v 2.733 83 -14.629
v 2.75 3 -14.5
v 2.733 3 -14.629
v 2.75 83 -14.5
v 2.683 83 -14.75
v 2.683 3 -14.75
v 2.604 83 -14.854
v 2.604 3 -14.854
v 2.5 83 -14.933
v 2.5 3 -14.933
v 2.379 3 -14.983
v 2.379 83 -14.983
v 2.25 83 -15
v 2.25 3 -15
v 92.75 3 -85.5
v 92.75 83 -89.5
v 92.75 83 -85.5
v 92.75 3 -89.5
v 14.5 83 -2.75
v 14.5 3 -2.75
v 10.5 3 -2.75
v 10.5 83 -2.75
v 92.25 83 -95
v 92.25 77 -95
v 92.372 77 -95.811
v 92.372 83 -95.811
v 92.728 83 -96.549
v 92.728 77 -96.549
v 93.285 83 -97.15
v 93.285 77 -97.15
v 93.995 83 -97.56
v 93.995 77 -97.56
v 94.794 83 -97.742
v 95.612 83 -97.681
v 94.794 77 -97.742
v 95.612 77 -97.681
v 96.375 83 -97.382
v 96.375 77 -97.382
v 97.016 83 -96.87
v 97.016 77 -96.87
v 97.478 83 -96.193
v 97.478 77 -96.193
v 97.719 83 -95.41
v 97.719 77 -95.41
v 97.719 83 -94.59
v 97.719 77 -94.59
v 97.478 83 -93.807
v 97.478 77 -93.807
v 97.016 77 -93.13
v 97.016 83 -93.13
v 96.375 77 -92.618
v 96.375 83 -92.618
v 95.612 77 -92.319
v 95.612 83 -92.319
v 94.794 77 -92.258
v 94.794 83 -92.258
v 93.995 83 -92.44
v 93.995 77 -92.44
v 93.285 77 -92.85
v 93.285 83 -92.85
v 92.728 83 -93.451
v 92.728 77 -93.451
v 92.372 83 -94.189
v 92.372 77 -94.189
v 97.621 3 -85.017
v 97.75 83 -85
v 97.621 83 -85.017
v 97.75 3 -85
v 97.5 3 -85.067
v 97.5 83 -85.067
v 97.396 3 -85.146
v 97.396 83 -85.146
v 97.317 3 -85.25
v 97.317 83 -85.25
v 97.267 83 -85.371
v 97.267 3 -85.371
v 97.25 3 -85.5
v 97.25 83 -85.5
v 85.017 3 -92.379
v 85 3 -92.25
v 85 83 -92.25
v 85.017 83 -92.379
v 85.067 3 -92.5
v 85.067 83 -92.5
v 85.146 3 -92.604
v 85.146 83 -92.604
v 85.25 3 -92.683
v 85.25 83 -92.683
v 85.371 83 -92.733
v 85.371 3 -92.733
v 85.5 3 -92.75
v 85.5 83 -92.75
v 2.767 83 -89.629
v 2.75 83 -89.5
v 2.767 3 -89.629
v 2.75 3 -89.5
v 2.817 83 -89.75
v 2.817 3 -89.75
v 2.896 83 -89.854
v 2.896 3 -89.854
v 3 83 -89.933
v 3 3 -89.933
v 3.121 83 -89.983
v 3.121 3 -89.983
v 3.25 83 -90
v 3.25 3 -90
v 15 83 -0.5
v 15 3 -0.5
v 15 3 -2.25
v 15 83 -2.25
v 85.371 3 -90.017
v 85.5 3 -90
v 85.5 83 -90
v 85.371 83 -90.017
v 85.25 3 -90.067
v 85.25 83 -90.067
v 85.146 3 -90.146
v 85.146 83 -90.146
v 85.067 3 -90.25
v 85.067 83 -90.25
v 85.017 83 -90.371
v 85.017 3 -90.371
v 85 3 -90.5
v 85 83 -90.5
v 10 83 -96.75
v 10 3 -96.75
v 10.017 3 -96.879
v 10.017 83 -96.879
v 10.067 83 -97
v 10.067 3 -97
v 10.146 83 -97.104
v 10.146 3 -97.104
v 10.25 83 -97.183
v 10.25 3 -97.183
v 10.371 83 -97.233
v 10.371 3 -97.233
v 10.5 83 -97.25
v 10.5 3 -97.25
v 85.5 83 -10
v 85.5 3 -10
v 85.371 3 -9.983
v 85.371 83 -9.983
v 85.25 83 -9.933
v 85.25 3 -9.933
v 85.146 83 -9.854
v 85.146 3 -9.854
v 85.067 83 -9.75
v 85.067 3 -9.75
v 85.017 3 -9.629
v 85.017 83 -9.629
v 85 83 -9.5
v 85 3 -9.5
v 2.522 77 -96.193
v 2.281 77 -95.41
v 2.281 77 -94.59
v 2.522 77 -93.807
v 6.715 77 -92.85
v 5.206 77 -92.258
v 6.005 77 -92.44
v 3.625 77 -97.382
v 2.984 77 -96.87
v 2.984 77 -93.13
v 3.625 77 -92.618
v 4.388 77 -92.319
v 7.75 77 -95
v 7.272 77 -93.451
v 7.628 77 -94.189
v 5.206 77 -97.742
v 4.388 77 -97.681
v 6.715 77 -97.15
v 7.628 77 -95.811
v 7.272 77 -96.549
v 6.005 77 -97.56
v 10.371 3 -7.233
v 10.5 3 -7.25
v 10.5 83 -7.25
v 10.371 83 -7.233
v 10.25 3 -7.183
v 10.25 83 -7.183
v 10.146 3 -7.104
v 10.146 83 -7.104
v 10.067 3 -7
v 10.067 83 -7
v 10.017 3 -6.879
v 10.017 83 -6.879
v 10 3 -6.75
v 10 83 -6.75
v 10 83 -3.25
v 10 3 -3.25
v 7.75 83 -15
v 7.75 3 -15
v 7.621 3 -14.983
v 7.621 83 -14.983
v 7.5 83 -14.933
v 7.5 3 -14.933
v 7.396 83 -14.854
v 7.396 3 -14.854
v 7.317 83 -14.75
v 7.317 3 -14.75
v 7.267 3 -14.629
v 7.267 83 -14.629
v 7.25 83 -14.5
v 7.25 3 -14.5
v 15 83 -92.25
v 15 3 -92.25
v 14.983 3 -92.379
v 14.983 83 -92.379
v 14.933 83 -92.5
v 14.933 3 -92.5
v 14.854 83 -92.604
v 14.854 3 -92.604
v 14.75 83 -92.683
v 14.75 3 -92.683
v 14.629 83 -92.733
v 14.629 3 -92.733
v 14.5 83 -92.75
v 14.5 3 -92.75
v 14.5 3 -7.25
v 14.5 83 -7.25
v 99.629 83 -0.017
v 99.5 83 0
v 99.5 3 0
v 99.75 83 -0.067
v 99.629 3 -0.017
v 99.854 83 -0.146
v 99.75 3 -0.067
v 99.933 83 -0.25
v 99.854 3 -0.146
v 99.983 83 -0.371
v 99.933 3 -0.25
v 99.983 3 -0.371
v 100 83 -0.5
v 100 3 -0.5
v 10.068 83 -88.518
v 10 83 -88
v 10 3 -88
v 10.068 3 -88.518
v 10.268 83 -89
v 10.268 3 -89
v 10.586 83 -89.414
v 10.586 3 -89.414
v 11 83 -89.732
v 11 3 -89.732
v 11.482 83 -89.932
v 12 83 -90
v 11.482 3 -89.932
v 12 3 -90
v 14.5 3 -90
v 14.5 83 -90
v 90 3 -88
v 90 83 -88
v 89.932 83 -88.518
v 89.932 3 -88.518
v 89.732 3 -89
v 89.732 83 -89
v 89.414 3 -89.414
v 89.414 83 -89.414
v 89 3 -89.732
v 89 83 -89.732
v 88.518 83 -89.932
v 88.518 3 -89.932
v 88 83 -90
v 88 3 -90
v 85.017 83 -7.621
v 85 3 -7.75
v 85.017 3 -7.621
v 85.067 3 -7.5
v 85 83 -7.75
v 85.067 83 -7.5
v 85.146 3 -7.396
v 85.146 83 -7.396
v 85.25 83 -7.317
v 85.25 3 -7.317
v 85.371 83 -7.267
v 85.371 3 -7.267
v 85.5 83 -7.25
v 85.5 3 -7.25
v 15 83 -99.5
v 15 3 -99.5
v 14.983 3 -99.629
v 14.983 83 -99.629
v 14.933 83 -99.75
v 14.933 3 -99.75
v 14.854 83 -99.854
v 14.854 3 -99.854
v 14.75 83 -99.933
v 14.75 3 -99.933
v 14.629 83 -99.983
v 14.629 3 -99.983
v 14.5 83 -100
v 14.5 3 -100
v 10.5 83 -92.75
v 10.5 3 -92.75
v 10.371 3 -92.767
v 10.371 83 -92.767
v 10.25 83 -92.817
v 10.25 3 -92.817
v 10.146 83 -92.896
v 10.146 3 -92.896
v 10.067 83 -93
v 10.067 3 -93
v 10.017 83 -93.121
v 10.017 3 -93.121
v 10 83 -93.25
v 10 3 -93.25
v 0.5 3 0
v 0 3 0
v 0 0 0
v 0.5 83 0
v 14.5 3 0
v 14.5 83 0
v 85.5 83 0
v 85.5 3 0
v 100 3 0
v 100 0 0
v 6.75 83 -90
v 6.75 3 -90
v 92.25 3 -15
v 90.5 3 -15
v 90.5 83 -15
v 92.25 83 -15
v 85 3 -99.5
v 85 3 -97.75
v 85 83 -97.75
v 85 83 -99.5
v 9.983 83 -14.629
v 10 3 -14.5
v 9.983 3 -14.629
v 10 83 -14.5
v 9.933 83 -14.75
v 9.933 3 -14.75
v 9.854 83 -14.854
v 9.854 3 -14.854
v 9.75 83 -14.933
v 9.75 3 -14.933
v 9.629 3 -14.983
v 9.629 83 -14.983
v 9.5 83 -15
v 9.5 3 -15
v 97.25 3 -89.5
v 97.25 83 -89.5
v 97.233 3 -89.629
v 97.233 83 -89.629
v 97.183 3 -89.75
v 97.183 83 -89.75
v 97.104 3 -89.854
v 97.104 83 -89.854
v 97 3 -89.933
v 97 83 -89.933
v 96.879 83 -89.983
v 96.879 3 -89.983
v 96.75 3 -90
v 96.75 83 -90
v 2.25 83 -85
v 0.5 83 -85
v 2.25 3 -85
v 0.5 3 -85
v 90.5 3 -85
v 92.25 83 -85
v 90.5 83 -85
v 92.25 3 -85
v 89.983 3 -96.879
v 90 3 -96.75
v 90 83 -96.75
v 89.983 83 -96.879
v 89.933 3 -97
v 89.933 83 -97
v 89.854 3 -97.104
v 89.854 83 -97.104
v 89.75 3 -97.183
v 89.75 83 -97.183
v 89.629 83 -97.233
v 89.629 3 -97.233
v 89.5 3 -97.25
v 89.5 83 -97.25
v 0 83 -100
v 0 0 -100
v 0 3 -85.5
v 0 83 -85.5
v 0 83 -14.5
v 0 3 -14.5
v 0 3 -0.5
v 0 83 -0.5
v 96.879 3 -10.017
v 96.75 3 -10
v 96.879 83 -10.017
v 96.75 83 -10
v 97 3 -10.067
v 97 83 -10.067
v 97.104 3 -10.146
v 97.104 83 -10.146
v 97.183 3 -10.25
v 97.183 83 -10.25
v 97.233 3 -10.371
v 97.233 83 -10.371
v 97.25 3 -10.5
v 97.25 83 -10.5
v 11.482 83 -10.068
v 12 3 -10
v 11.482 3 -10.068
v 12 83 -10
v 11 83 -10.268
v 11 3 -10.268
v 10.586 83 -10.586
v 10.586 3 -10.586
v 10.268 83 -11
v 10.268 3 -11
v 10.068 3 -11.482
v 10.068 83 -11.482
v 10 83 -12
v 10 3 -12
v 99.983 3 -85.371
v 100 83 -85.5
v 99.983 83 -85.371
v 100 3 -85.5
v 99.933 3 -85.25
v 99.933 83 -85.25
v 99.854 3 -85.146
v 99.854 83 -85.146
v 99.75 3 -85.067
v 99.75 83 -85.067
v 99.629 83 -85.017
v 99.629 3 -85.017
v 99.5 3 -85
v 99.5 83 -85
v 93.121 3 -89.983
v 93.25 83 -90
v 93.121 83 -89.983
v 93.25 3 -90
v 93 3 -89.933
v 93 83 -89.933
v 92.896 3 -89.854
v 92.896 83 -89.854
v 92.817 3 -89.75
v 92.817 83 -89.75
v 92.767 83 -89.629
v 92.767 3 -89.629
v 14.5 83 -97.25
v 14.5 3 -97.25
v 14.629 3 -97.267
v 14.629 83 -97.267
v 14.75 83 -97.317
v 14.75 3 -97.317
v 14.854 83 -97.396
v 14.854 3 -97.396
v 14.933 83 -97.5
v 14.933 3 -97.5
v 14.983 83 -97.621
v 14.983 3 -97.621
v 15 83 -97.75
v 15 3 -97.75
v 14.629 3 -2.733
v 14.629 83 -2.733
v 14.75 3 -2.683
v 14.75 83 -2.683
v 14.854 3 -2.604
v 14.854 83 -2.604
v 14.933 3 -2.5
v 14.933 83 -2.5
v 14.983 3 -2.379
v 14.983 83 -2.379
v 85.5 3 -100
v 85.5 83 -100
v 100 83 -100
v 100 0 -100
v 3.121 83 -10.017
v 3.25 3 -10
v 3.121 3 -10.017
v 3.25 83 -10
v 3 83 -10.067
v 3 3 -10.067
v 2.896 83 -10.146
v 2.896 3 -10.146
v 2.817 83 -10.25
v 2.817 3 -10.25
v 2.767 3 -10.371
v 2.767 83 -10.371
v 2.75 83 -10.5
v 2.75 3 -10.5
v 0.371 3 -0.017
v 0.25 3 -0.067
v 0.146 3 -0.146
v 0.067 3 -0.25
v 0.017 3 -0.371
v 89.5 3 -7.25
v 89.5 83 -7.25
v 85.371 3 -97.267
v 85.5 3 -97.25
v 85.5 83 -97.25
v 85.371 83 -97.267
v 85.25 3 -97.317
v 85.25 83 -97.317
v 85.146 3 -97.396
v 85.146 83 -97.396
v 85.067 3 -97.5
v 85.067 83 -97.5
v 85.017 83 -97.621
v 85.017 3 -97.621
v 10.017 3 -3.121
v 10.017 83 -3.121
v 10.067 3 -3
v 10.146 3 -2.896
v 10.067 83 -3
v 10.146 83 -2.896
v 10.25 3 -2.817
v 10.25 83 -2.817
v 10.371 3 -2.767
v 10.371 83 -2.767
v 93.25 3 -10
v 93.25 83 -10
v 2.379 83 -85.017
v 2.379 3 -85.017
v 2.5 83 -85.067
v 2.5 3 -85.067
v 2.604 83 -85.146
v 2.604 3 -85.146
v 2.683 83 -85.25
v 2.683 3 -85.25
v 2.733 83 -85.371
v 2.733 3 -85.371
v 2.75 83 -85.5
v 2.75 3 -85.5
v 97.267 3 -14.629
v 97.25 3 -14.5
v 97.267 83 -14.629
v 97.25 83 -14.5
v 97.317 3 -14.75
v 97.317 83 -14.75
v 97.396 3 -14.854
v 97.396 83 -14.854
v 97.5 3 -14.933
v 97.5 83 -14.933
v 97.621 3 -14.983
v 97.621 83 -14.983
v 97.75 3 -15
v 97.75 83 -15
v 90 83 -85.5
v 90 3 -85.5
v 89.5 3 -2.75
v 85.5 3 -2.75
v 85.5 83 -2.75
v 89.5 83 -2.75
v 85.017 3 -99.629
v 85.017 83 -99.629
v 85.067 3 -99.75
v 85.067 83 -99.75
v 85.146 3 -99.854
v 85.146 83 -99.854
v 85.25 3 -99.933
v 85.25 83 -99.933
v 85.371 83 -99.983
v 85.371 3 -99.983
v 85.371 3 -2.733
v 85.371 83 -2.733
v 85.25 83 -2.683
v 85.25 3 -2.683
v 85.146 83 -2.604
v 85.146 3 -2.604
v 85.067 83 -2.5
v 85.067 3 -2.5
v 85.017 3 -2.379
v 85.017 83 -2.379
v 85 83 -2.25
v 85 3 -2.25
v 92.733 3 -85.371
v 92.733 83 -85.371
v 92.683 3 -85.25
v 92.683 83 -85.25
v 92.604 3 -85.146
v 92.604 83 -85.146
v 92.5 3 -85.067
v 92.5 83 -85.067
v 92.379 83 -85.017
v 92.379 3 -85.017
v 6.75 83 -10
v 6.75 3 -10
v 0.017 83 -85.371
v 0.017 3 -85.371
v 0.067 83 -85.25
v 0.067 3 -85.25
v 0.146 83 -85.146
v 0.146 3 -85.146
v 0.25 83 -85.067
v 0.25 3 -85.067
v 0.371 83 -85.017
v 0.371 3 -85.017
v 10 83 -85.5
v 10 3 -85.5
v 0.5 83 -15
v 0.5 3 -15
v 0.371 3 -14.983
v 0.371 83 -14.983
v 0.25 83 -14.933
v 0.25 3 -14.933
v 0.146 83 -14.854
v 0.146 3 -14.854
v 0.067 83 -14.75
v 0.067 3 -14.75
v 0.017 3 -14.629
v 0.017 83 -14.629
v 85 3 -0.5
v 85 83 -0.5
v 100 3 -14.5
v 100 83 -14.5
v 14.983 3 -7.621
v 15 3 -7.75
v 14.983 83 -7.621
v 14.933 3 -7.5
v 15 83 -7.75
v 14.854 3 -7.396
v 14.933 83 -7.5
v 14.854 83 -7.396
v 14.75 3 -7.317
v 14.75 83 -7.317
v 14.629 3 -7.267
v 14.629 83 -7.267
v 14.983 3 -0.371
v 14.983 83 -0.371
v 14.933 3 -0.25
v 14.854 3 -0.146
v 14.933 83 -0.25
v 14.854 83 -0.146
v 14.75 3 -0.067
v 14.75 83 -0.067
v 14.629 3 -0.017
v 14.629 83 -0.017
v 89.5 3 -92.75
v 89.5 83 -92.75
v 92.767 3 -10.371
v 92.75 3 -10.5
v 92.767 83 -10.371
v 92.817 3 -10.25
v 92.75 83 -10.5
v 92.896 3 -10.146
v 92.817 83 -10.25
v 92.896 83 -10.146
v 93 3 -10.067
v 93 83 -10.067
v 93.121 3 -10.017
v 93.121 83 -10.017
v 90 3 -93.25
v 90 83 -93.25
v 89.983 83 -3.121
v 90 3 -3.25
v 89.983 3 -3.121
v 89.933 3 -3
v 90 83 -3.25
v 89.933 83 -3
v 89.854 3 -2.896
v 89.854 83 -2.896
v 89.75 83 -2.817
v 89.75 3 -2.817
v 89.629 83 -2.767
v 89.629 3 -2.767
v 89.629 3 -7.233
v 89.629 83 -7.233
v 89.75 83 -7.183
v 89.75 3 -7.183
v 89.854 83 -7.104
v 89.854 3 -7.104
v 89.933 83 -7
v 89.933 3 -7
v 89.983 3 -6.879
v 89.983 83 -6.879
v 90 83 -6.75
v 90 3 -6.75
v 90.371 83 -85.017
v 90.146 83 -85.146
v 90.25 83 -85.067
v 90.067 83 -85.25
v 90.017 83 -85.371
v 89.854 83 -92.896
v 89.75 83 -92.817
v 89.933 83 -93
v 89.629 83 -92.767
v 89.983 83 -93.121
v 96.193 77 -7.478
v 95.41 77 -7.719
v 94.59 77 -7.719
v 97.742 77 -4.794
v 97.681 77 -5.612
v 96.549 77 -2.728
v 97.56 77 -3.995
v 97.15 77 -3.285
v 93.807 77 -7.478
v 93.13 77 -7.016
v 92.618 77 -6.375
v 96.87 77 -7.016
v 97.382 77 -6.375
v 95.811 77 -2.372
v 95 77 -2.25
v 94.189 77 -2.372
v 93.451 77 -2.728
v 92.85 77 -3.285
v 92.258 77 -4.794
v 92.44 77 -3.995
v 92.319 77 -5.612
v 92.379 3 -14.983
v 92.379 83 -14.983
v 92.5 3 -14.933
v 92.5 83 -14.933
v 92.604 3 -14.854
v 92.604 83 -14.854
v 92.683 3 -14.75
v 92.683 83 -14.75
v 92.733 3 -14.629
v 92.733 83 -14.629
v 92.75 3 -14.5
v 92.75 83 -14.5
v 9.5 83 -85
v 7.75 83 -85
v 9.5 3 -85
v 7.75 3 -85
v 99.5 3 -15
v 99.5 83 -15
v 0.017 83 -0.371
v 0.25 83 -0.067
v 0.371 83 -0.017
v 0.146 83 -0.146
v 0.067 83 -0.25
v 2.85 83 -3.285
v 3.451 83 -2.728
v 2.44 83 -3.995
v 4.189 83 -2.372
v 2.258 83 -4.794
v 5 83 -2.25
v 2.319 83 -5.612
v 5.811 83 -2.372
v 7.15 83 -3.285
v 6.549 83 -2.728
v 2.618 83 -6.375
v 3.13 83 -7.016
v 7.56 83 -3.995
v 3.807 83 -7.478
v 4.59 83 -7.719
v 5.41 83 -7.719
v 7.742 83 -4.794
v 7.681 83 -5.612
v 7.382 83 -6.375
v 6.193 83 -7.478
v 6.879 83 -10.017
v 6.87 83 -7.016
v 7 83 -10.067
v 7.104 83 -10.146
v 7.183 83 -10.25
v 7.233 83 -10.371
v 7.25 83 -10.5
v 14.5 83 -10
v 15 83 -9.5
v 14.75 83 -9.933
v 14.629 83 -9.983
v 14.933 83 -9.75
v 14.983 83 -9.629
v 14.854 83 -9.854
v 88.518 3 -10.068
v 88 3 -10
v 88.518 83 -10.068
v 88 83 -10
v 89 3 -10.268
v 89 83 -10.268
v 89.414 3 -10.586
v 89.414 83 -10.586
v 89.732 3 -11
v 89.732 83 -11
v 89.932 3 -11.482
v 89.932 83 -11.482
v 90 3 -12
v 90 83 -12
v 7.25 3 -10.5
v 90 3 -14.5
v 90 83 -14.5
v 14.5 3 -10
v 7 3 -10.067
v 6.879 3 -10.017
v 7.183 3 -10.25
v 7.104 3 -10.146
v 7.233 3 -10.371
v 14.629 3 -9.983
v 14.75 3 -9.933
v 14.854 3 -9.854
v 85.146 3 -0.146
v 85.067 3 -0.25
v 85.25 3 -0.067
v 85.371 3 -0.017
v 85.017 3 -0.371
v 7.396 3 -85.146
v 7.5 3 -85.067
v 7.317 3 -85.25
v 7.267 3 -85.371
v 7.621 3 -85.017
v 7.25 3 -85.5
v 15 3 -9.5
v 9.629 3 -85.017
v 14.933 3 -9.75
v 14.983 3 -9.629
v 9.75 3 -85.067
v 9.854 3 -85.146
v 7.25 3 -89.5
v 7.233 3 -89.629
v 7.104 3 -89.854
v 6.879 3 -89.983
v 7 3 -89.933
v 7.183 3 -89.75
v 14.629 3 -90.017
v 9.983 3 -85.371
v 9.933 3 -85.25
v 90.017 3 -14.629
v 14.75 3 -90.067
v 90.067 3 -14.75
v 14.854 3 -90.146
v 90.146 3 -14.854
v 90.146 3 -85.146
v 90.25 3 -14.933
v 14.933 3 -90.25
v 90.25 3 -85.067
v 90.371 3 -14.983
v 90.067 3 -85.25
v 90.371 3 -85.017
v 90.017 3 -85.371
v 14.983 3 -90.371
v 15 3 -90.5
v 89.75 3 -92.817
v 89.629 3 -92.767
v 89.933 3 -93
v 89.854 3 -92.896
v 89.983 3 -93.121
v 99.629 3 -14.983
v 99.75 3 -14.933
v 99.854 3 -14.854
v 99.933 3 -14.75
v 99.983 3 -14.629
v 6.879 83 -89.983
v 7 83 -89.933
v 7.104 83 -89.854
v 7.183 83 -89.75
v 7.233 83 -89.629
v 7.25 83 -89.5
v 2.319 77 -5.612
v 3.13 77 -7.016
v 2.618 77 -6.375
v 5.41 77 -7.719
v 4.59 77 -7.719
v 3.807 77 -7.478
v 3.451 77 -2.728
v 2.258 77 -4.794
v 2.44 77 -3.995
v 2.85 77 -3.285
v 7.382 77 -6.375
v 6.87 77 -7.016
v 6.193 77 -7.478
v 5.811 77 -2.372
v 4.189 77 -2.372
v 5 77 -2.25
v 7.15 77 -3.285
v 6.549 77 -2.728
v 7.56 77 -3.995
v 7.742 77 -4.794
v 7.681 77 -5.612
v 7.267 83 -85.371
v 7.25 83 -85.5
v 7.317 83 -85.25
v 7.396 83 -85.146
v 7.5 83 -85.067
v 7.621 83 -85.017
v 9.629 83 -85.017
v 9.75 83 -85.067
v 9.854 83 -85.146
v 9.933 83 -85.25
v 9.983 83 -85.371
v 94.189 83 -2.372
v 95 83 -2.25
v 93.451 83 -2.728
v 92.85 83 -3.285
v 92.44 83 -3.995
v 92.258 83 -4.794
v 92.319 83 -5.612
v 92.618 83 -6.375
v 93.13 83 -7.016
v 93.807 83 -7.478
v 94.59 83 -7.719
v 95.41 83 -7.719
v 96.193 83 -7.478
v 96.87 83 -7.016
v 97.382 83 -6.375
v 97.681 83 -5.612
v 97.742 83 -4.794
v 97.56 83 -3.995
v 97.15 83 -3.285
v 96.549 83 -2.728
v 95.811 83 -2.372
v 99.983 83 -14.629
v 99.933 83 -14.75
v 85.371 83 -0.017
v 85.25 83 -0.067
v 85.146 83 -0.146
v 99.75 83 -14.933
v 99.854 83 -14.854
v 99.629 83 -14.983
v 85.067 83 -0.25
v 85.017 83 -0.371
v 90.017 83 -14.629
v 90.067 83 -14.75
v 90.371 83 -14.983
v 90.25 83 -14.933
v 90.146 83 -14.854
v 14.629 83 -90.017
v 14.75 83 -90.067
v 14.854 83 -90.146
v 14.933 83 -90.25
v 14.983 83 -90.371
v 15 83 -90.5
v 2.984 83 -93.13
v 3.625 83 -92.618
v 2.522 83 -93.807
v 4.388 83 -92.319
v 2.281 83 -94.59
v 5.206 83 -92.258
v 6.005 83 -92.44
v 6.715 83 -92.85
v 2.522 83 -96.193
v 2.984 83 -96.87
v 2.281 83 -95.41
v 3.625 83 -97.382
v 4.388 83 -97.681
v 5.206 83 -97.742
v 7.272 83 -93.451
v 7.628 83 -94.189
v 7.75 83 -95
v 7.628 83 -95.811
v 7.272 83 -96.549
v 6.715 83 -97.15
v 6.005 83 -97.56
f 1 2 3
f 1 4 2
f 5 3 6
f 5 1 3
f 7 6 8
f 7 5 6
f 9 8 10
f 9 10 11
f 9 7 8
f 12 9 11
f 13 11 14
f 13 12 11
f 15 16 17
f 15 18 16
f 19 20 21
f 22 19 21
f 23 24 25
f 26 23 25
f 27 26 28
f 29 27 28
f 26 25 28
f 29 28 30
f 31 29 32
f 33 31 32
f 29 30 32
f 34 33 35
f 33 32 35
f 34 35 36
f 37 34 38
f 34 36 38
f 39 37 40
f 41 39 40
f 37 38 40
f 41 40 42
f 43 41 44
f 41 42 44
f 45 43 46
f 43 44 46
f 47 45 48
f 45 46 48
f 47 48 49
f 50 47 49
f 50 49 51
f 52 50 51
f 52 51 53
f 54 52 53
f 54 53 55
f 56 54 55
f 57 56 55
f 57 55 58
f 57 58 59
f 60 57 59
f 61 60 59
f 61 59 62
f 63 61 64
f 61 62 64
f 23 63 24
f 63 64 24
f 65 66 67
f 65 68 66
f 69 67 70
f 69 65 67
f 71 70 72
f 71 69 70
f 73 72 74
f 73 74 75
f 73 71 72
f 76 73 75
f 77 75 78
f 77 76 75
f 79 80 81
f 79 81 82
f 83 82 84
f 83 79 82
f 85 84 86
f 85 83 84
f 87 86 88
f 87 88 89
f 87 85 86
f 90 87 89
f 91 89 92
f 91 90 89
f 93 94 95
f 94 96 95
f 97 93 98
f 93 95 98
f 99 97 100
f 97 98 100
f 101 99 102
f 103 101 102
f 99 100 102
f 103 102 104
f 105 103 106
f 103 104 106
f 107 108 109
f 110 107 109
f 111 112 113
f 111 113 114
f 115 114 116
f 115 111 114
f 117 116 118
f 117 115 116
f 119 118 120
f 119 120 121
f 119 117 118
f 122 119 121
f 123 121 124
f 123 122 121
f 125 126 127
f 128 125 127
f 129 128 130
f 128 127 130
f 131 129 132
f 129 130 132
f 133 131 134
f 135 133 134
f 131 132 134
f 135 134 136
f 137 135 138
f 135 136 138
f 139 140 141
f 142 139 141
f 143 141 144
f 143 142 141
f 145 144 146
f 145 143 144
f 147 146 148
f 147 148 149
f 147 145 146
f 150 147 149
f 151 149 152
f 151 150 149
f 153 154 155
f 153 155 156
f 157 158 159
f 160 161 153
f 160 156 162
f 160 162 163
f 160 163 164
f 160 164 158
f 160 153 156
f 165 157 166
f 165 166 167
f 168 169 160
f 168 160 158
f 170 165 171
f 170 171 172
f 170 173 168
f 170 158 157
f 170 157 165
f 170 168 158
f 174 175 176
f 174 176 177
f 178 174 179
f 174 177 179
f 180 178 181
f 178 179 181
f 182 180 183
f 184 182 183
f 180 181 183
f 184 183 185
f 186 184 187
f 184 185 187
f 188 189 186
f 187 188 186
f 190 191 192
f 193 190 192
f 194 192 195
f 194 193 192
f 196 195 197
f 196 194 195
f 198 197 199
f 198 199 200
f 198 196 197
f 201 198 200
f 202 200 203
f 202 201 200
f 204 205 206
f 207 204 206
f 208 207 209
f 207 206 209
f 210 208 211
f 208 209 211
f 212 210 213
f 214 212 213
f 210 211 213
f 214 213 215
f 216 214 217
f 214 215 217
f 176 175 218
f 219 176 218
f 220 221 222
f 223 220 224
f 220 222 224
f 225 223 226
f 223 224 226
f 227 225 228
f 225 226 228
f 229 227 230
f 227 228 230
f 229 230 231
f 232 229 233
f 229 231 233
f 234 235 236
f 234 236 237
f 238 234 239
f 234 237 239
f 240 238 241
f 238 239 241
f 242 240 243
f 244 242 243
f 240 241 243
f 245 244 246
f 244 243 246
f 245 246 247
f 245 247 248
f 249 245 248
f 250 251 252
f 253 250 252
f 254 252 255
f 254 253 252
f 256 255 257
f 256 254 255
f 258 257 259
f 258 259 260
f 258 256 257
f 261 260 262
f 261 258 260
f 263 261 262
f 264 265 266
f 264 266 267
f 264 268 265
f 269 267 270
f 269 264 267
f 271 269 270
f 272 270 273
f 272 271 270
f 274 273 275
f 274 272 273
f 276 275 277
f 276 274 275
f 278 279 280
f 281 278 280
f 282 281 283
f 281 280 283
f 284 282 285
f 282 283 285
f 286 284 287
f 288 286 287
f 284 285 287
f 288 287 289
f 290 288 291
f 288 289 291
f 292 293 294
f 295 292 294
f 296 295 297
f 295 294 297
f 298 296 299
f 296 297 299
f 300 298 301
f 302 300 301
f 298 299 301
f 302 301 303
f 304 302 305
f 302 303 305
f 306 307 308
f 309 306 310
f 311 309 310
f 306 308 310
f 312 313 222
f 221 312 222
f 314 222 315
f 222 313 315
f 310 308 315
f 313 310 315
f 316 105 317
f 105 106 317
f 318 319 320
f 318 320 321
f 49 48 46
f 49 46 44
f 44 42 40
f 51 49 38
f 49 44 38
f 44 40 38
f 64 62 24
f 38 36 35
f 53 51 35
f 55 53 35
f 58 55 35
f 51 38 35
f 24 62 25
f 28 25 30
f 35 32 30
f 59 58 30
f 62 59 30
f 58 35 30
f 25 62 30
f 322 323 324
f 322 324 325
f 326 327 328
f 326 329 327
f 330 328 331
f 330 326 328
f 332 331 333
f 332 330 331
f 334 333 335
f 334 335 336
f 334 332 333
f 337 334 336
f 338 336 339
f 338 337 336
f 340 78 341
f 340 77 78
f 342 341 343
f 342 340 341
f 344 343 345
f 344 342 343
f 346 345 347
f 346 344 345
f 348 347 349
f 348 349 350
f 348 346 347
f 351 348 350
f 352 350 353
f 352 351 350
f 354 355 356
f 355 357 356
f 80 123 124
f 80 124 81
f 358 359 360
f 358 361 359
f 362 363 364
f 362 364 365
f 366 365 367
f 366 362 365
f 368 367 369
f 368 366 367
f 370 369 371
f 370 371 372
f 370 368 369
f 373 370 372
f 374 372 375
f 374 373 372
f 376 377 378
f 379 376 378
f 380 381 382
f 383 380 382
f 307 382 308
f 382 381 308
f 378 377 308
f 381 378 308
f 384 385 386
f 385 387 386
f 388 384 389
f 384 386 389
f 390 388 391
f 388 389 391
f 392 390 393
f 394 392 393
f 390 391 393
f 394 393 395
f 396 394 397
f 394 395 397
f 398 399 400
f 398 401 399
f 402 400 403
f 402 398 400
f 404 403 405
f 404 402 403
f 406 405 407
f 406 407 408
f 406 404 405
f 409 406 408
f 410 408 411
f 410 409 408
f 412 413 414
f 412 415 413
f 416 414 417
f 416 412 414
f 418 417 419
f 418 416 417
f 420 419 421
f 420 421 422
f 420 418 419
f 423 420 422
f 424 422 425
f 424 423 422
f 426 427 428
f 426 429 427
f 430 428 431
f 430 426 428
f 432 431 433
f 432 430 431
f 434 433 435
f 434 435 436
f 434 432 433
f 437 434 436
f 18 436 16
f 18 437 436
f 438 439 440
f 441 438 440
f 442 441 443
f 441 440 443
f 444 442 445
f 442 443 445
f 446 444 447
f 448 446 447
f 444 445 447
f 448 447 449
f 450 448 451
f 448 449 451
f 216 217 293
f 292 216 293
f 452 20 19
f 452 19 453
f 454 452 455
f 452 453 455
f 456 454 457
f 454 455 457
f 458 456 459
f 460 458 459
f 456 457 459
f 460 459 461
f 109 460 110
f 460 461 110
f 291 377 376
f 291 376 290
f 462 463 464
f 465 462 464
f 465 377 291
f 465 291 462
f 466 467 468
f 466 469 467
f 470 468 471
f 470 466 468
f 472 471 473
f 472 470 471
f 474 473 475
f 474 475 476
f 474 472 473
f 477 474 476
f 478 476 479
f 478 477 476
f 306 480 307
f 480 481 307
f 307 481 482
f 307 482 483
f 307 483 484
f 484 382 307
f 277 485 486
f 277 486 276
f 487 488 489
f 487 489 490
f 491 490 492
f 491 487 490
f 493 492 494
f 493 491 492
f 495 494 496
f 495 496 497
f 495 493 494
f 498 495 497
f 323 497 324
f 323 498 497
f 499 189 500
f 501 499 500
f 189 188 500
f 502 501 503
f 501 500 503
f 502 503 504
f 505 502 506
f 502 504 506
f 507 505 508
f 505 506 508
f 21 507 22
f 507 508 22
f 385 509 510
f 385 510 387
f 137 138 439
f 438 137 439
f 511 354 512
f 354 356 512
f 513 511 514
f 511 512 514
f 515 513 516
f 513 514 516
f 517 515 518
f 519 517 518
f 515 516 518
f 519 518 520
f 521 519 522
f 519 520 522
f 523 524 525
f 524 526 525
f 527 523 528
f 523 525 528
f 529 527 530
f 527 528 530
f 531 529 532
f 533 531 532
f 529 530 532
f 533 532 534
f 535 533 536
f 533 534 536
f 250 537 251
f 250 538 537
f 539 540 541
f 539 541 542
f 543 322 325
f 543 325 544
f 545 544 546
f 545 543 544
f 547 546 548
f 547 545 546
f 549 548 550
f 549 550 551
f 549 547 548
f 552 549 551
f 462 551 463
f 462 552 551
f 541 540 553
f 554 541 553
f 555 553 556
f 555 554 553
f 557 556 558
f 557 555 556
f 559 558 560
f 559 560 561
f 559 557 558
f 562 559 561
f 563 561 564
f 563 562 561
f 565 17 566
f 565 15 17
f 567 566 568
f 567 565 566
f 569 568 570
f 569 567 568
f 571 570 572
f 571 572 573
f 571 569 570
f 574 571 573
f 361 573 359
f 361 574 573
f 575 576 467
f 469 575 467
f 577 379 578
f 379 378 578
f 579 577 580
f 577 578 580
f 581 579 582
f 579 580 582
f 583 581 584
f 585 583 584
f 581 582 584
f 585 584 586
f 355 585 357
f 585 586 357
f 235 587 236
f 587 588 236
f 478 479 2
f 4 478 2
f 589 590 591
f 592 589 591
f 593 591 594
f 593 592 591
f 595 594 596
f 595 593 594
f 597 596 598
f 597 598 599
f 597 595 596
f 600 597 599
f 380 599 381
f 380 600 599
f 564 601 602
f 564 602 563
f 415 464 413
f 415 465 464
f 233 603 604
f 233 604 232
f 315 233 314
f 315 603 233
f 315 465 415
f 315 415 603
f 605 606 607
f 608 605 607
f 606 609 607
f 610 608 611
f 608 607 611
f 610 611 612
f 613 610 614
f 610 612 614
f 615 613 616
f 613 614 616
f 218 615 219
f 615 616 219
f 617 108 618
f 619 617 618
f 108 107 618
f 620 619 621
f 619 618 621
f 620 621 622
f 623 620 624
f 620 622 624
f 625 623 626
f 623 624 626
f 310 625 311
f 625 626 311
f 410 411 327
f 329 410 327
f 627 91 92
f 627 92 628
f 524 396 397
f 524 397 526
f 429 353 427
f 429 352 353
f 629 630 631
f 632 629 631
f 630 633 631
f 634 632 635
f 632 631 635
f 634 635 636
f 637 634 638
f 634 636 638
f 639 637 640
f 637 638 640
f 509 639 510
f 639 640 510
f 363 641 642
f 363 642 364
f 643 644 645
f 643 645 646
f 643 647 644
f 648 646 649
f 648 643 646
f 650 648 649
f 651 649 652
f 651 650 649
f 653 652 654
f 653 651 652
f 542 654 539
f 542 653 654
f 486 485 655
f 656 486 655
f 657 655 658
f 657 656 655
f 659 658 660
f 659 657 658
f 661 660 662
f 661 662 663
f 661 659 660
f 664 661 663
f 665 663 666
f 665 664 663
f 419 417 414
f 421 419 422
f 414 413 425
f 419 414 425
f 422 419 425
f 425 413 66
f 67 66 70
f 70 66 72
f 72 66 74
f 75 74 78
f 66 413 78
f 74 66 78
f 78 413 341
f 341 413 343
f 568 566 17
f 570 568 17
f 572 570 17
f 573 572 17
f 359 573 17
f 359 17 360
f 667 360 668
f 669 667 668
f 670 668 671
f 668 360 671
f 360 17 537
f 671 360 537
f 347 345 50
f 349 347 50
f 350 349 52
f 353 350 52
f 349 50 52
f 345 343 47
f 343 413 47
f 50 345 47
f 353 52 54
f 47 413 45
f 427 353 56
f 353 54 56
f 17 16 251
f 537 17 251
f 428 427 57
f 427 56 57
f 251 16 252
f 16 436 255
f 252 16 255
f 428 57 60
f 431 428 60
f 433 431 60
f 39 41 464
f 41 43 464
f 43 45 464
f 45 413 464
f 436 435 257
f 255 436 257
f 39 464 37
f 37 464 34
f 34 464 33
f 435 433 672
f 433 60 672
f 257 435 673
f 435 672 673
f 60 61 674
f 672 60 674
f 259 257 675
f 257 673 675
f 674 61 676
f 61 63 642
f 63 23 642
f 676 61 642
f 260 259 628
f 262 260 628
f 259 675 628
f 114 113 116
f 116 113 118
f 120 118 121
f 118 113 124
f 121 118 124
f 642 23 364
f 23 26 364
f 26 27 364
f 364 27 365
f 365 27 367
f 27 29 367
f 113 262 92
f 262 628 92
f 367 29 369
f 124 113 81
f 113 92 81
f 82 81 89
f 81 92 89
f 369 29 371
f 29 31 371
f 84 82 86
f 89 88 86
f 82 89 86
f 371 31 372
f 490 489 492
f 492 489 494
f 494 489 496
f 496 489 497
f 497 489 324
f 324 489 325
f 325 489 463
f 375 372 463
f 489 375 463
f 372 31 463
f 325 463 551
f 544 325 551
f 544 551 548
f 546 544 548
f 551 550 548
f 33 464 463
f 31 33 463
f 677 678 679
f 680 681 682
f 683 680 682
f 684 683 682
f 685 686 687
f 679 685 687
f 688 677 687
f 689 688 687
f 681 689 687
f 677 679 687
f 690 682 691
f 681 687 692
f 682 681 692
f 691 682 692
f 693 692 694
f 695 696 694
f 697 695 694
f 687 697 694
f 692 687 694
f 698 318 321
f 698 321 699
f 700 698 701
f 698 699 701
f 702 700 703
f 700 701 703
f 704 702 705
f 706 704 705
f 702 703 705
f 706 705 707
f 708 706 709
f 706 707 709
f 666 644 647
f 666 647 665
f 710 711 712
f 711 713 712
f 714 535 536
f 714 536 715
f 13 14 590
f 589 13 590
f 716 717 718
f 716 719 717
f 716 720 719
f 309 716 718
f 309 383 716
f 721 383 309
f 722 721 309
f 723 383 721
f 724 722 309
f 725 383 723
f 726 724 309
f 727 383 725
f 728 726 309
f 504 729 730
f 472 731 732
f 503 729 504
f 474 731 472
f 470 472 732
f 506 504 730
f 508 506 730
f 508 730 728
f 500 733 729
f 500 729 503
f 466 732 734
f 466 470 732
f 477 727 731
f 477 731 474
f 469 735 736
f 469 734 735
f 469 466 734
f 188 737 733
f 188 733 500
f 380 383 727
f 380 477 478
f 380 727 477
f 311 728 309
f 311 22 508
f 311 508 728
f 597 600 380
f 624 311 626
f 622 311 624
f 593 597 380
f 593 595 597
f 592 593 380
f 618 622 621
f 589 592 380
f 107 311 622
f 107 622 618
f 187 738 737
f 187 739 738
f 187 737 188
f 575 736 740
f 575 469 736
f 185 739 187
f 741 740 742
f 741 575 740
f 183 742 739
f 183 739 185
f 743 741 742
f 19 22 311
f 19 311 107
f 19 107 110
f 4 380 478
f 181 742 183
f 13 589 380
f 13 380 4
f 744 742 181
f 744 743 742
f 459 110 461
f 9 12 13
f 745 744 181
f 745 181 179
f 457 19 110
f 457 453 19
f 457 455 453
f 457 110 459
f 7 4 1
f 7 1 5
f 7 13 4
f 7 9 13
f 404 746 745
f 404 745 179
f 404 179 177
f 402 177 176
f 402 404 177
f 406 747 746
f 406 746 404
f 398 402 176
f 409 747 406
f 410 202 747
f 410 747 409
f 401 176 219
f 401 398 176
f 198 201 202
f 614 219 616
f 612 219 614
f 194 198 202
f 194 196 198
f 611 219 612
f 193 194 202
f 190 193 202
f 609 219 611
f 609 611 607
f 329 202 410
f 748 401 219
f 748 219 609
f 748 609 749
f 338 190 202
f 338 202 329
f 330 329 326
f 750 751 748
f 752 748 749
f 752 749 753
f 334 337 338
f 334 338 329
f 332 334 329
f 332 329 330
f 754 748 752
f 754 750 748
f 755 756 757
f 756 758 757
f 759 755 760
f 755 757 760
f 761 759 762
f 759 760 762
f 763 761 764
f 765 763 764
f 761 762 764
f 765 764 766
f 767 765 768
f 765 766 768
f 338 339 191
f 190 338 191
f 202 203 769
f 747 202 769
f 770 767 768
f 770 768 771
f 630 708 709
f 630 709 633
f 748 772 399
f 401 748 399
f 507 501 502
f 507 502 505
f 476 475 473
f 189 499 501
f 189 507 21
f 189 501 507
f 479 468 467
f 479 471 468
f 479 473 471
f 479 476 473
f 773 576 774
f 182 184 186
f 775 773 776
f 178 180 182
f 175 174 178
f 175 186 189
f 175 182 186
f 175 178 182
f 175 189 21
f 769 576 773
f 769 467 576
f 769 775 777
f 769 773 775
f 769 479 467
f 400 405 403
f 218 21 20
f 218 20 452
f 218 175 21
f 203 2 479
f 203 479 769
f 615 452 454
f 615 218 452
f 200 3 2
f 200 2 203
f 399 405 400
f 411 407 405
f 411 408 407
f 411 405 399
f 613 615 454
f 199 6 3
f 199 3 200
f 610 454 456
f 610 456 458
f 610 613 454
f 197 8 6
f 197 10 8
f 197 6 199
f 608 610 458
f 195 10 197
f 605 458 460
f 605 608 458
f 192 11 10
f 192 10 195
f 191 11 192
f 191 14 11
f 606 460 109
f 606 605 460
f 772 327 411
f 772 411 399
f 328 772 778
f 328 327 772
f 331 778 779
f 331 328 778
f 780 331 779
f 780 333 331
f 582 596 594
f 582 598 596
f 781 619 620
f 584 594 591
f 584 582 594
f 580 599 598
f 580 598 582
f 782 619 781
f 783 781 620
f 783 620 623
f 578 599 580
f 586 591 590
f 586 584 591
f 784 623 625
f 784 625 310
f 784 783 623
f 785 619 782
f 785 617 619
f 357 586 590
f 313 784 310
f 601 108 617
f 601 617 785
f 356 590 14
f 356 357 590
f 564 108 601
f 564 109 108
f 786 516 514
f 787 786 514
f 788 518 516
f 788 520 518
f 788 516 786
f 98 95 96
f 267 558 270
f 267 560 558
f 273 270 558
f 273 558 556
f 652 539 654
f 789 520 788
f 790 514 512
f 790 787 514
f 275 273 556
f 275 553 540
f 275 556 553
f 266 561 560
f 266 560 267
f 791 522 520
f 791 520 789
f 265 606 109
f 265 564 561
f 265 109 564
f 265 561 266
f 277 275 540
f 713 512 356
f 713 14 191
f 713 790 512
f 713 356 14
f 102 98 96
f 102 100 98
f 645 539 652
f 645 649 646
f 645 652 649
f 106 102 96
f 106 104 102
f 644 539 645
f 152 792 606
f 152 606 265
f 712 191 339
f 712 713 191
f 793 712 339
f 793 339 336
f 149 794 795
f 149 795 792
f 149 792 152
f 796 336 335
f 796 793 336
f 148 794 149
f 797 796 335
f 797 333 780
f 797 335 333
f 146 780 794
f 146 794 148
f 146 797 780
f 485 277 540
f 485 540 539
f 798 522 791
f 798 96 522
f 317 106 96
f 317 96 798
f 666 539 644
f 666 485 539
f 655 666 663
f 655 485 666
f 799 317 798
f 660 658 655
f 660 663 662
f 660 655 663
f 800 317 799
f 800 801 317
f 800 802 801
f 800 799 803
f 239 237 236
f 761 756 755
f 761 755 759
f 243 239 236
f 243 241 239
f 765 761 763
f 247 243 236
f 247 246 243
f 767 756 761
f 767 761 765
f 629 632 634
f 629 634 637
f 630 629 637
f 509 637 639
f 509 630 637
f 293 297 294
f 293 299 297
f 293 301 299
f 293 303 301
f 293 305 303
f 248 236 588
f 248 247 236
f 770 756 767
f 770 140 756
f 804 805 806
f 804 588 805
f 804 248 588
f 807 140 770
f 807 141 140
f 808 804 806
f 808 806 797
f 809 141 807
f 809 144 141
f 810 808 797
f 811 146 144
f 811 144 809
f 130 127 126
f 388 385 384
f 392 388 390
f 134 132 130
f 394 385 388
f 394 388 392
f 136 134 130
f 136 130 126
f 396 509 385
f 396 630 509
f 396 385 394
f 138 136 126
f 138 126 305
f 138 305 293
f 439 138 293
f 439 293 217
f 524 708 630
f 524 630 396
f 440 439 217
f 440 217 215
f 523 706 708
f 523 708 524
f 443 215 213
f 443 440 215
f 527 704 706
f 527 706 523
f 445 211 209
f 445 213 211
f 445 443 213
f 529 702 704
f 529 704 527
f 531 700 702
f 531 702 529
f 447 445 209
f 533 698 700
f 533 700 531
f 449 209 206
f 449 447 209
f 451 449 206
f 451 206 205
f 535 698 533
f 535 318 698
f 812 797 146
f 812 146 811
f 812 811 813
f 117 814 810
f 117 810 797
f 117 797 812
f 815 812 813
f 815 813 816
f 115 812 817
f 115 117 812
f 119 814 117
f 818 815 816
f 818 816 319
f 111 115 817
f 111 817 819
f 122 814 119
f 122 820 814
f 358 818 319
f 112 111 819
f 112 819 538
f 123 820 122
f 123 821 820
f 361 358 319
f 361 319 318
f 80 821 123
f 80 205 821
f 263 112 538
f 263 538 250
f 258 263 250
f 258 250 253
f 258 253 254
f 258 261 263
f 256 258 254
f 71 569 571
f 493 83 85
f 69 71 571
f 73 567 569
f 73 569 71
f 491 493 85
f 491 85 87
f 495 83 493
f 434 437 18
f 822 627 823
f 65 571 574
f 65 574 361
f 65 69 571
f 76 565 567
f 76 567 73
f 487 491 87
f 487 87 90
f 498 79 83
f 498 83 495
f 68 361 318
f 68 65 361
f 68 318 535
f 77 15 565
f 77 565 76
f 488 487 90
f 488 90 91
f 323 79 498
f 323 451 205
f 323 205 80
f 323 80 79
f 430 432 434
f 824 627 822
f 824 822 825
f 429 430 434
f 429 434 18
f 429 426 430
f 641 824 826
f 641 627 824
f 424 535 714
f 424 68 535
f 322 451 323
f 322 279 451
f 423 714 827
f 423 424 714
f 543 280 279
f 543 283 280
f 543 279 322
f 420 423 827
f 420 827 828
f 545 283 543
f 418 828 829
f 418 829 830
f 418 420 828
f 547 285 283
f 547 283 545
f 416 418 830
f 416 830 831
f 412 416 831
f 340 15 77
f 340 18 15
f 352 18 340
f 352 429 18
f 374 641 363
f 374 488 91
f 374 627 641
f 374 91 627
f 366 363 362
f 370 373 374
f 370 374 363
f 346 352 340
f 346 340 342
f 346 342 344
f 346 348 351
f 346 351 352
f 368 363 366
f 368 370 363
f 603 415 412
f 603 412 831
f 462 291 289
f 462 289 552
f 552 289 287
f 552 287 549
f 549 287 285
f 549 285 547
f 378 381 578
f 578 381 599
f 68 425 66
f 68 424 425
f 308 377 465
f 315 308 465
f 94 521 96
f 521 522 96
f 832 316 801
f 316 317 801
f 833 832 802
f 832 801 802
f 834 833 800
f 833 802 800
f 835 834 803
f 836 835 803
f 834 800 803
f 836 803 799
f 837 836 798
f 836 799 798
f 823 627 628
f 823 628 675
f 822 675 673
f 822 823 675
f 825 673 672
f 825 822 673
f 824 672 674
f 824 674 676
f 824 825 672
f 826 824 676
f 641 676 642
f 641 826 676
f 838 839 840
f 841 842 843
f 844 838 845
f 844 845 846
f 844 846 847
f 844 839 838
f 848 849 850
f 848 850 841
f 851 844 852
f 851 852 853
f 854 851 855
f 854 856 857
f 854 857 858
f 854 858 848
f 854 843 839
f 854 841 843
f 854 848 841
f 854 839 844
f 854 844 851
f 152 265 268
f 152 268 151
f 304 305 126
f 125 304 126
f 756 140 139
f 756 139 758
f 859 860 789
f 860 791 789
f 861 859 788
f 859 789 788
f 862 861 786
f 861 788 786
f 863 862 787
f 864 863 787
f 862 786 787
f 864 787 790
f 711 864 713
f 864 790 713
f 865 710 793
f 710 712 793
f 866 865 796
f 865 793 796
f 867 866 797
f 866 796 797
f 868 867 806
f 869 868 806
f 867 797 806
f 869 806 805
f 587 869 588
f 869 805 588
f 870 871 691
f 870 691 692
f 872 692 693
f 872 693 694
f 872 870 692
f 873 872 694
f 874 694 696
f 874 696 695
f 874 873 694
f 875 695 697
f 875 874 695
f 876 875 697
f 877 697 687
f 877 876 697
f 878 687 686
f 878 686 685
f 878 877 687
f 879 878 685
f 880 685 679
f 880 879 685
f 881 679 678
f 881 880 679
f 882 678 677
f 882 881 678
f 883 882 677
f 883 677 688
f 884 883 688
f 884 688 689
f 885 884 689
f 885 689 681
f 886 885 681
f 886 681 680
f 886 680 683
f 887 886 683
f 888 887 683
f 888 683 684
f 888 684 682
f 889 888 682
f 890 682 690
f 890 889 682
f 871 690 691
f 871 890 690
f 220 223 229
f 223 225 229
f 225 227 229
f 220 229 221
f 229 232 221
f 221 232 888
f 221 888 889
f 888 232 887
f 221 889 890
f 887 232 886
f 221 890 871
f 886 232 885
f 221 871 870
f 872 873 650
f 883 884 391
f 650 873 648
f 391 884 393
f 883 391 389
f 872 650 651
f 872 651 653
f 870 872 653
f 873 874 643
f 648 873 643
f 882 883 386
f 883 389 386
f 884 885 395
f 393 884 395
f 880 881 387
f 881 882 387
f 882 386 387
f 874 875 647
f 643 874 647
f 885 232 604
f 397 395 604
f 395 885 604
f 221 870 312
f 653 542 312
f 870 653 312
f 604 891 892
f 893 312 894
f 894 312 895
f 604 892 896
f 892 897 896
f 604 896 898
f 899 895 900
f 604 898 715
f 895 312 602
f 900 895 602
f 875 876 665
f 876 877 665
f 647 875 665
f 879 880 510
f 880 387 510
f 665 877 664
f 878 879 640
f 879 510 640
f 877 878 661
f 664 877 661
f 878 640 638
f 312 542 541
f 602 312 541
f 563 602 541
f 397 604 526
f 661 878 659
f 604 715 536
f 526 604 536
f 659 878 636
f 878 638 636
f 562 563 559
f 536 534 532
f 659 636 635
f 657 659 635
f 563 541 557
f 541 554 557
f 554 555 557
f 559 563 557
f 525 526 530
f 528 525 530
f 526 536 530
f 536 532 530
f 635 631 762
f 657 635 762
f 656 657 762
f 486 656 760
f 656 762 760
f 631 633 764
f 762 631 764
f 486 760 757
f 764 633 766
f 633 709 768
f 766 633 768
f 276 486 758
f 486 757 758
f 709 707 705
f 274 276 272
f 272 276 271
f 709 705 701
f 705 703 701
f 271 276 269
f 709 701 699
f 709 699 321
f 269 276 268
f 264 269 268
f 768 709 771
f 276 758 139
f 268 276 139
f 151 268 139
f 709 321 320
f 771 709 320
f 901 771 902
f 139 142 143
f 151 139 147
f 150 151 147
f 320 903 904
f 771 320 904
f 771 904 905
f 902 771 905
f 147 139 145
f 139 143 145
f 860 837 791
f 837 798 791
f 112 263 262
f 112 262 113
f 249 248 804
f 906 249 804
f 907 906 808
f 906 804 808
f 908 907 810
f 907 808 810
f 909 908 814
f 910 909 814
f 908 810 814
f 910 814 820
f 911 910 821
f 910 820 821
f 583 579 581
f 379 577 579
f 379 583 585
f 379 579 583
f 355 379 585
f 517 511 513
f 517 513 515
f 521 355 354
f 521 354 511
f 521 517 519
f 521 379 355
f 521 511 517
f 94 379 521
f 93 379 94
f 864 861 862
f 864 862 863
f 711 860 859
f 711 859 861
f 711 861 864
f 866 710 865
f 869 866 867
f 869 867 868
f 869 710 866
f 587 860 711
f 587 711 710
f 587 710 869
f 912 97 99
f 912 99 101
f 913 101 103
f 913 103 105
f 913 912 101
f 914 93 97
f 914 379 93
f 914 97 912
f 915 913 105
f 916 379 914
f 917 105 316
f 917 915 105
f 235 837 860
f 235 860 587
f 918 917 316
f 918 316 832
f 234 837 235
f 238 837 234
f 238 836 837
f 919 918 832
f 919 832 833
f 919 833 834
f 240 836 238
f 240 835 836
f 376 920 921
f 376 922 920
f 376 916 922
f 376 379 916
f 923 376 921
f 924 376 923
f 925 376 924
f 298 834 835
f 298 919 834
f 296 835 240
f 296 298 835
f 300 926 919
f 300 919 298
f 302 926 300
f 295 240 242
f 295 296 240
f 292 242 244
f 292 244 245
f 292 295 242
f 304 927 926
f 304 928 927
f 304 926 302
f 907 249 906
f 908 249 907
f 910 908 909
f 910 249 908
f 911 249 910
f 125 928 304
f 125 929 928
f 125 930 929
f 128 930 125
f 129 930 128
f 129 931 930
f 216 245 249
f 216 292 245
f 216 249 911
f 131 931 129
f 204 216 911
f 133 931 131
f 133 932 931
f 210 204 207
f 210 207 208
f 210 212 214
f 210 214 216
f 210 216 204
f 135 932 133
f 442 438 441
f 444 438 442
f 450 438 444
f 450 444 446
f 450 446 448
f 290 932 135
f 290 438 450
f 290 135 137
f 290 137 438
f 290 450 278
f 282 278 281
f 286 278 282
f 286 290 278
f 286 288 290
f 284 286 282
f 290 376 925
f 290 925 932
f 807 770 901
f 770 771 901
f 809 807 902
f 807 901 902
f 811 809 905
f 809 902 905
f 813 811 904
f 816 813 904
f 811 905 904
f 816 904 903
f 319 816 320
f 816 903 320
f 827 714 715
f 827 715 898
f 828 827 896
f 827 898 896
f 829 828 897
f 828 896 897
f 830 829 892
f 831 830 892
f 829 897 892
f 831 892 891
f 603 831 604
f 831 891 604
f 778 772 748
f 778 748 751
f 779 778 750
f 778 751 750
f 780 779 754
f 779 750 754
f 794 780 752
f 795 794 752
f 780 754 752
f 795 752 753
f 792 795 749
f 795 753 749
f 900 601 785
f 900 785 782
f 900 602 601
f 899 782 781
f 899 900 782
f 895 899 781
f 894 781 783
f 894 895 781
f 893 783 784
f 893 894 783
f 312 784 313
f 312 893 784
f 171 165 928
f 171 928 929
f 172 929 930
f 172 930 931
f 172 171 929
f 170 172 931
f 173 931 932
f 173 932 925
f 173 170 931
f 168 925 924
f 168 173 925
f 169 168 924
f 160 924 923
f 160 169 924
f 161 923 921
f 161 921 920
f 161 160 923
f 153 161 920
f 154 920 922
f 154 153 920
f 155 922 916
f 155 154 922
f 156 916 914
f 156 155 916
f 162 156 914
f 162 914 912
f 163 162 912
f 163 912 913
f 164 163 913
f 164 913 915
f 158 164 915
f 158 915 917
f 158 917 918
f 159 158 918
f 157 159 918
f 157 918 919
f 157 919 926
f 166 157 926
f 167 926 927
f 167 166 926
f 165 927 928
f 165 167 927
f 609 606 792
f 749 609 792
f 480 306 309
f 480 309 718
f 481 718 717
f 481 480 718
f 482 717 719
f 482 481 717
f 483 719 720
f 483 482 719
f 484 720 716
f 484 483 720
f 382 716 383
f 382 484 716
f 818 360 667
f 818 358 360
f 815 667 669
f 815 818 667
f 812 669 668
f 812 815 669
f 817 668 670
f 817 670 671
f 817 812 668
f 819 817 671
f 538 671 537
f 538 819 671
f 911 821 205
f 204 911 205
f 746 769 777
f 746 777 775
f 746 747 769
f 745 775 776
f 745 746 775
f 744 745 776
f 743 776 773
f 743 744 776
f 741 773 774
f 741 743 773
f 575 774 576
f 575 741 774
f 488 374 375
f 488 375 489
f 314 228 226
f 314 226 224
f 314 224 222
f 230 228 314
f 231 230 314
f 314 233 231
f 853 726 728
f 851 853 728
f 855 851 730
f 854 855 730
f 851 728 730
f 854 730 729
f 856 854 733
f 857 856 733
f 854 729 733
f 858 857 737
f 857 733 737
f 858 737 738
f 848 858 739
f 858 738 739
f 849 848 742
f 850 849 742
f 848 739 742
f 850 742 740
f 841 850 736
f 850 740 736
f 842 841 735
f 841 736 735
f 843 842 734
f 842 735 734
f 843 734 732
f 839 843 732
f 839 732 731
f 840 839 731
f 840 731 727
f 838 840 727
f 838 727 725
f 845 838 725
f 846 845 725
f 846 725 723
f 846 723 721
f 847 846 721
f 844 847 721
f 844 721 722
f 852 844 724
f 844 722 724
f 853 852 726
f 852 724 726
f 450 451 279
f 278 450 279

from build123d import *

# Parameters (mm, degrees)
SKETCH1_W           = 100
SKETCH1_H           = 100
BOSS_EXTRUDE1_DEPTH = 3
BOSS_EXTRUDE2_DEPTH = 80
SKETCH3_R           = 2.75
CUT_EXTRUDE1_DEPTH  = 6
FILLET3_R           = 2
FILLET4_R           = 0.5
MIRROR1_START       = 3
MIRROR1_DEPTH       = 74
MIRROR1_START_2     = 77
MIRROR1_2_OUTLINE_R = 2.75
MIRROR1_2_DEPTH     = 6


# Read off the part's stored shape, not the designer's step: Mirror1
with BuildPart() as part:
    # Sketch1 → Boss-Extrude1 (new body)
    with BuildSketch(Plane(origin=(0, 0, 0), x_dir=(1, 0, 0), z_dir=(0, 1, 0))):
        with Locations((50, 50)):
            Rectangle(SKETCH1_W, SKETCH1_H)
    extrude(amount=BOSS_EXTRUDE1_DEPTH)

    # Sketch2 → Boss-Extrude2 (add)
    with BuildSketch(Plane(origin=(0, 3, 0), x_dir=(1, 0, 0), z_dir=(0, 1, 0))):
        Polygon((0, 0), (10, 0), (15, 0), (15, 2.75), (10, 2.75), (10, 7.25), (15, 7.25), (15, 10), (10, 10), (10, 15), (7.25, 15), (7.25, 10), (2.75, 10), (2.75, 15), (0, 15), (0, 10), align=None)
    extrude(amount=BOSS_EXTRUDE2_DEPTH)

    # Sketch3 → Cut-Extrude1 (cut)
    with BuildSketch(Plane(origin=(0, 83, 0), x_dir=(1, 0, 0), z_dir=(0, 1, 0))):
        with Locations(Location((5, 5, 0), (0, 0, 270))):
            Circle(SKETCH3_R)
    extrude(amount=-CUT_EXTRUDE1_DEPTH, mode=Mode.SUBTRACT)

    # Fillet3
    fillet3_edges = [part.edges().sort_by_distance(p)[0] for p in [
        (10, 43, -10),
    ]]
    fillet(fillet3_edges, radius=FILLET3_R)

    # Fillet4
    fillet4_edges = [part.edges().sort_by_distance(p)[0] for p in [
        (7.25, 43, -10),
        (2.75, 43, -10),
        (10, 43, -7.25),
        (10, 43, -2.75),
        (0, 41.5, 0),
        (0, 43, -15),
        (2.75, 43, -15),
        (7.25, 43, -15),
        (10, 43, -15),
        (15, 43, -10),
        (15, 43, -7.25),
        (15, 43, -2.75),
        (15, 43, 0),
    ]]
    fillet(fillet4_edges, radius=FILLET4_R)

    # Mirror1 outline → Mirror1 (add)
    with BuildSketch(Plane(origin=(0, 0, 0), x_dir=(1, 0, 0), z_dir=(0, 1, 0)).offset(MIRROR1_START)):
        with BuildLine():
            Line((0, 100), (0, 85.5))
            ThreePointArc((0, 85.5), (0.146446609, 85.146446609), (0.5, 85))
            Line((0.5, 85), (2.25, 85))
            ThreePointArc((2.25, 85), (2.603553391, 85.146446609), (2.75, 85.5))
            Line((2.75, 85.5), (2.75, 89.5))
            ThreePointArc((2.75, 89.5), (2.896446609, 89.853553391), (3.25, 90))
            Line((3.25, 90), (6.75, 90))
            ThreePointArc((6.75, 90), (7.103553391, 89.853553391), (7.25, 89.5))
            Line((7.25, 89.5), (7.25, 85.5))
            ThreePointArc((7.25, 85.5), (7.396446609, 85.146446609), (7.75, 85))
            Line((7.75, 85), (9.5, 85))
            ThreePointArc((9.5, 85), (9.853553391, 85.146446609), (10, 85.5))
            Line((10, 85.5), (10, 88))
            ThreePointArc((10, 88), (10.585786438, 89.414213562), (12, 90))
            Line((12, 90), (14.5, 90))
            ThreePointArc((14.5, 90), (14.853553391, 90.146446609), (15, 90.5))
            Line((15, 90.5), (15, 92.25))
            ThreePointArc((15, 92.25), (14.853553391, 92.603553391), (14.5, 92.75))
            Line((14.5, 92.75), (10.5, 92.75))
            ThreePointArc((10.5, 92.75), (10.146446609, 92.896446609), (10, 93.25))
            Line((10, 93.25), (10, 96.75))
            ThreePointArc((10, 96.75), (10.146446609, 97.103553391), (10.5, 97.25))
            Line((10.5, 97.25), (14.5, 97.25))
            ThreePointArc((14.5, 97.25), (14.853553391, 97.396446609), (15, 97.75))
            Line((15, 97.75), (15, 99.5))
            ThreePointArc((15, 99.5), (14.853553391, 99.853553391), (14.5, 100))
            Line((14.5, 100), (0, 100))
        make_face()
    extrude(amount=MIRROR1_DEPTH)

    # Mirror1 2 outline → Mirror1 2 (add)
    with BuildSketch(Plane(origin=(0, 0, 0), x_dir=(1, 0, 0), z_dir=(0, 1, 0)).offset(MIRROR1_START_2)):
        with BuildLine():
            Line((0, 100), (0, 85.5))
            ThreePointArc((0, 85.5), (0.146446609, 85.146446609), (0.5, 85))
            Line((0.5, 85), (2.25, 85))
            ThreePointArc((2.25, 85), (2.603553391, 85.146446609), (2.75, 85.5))
            Line((2.75, 85.5), (2.75, 89.5))
            ThreePointArc((2.75, 89.5), (2.896446609, 89.853553391), (3.25, 90))
            Line((3.25, 90), (6.75, 90))
            ThreePointArc((6.75, 90), (7.103553391, 89.853553391), (7.25, 89.5))
            Line((7.25, 89.5), (7.25, 85.5))
            ThreePointArc((7.25, 85.5), (7.396446609, 85.146446609), (7.75, 85))
            Line((7.75, 85), (9.5, 85))
            ThreePointArc((9.5, 85), (9.853553391, 85.146446609), (10, 85.5))
            Line((10, 85.5), (10, 88))
            ThreePointArc((10, 88), (10.585786438, 89.414213562), (12, 90))
            Line((12, 90), (14.5, 90))
            ThreePointArc((14.5, 90), (14.853553391, 90.146446609), (15, 90.5))
            Line((15, 90.5), (15, 92.25))
            ThreePointArc((15, 92.25), (14.853553391, 92.603553391), (14.5, 92.75))
            Line((14.5, 92.75), (10.5, 92.75))
            ThreePointArc((10.5, 92.75), (10.146446609, 92.896446609), (10, 93.25))
            Line((10, 93.25), (10, 96.75))
            ThreePointArc((10, 96.75), (10.146446609, 97.103553391), (10.5, 97.25))
            Line((10.5, 97.25), (14.5, 97.25))
            ThreePointArc((14.5, 97.25), (14.853553391, 97.396446609), (15, 97.75))
            Line((15, 97.75), (15, 99.5))
            ThreePointArc((15, 99.5), (14.853553391, 99.853553391), (14.5, 100))
            Line((14.5, 100), (0, 100))
        make_face()
        with Locations((5, 95)):
            Circle(MIRROR1_2_OUTLINE_R, mode=Mode.SUBTRACT)
    extrude(amount=MIRROR1_2_DEPTH)

    # Mirror2: part across plane


with BuildPart() as part_1:
    add(part.part)
    add(part.part.mirror(Plane(origin=(50, 0, 0), x_dir=(0, 0, 1), z_dir=(1, 0, 0))))


solid = part_1.part
